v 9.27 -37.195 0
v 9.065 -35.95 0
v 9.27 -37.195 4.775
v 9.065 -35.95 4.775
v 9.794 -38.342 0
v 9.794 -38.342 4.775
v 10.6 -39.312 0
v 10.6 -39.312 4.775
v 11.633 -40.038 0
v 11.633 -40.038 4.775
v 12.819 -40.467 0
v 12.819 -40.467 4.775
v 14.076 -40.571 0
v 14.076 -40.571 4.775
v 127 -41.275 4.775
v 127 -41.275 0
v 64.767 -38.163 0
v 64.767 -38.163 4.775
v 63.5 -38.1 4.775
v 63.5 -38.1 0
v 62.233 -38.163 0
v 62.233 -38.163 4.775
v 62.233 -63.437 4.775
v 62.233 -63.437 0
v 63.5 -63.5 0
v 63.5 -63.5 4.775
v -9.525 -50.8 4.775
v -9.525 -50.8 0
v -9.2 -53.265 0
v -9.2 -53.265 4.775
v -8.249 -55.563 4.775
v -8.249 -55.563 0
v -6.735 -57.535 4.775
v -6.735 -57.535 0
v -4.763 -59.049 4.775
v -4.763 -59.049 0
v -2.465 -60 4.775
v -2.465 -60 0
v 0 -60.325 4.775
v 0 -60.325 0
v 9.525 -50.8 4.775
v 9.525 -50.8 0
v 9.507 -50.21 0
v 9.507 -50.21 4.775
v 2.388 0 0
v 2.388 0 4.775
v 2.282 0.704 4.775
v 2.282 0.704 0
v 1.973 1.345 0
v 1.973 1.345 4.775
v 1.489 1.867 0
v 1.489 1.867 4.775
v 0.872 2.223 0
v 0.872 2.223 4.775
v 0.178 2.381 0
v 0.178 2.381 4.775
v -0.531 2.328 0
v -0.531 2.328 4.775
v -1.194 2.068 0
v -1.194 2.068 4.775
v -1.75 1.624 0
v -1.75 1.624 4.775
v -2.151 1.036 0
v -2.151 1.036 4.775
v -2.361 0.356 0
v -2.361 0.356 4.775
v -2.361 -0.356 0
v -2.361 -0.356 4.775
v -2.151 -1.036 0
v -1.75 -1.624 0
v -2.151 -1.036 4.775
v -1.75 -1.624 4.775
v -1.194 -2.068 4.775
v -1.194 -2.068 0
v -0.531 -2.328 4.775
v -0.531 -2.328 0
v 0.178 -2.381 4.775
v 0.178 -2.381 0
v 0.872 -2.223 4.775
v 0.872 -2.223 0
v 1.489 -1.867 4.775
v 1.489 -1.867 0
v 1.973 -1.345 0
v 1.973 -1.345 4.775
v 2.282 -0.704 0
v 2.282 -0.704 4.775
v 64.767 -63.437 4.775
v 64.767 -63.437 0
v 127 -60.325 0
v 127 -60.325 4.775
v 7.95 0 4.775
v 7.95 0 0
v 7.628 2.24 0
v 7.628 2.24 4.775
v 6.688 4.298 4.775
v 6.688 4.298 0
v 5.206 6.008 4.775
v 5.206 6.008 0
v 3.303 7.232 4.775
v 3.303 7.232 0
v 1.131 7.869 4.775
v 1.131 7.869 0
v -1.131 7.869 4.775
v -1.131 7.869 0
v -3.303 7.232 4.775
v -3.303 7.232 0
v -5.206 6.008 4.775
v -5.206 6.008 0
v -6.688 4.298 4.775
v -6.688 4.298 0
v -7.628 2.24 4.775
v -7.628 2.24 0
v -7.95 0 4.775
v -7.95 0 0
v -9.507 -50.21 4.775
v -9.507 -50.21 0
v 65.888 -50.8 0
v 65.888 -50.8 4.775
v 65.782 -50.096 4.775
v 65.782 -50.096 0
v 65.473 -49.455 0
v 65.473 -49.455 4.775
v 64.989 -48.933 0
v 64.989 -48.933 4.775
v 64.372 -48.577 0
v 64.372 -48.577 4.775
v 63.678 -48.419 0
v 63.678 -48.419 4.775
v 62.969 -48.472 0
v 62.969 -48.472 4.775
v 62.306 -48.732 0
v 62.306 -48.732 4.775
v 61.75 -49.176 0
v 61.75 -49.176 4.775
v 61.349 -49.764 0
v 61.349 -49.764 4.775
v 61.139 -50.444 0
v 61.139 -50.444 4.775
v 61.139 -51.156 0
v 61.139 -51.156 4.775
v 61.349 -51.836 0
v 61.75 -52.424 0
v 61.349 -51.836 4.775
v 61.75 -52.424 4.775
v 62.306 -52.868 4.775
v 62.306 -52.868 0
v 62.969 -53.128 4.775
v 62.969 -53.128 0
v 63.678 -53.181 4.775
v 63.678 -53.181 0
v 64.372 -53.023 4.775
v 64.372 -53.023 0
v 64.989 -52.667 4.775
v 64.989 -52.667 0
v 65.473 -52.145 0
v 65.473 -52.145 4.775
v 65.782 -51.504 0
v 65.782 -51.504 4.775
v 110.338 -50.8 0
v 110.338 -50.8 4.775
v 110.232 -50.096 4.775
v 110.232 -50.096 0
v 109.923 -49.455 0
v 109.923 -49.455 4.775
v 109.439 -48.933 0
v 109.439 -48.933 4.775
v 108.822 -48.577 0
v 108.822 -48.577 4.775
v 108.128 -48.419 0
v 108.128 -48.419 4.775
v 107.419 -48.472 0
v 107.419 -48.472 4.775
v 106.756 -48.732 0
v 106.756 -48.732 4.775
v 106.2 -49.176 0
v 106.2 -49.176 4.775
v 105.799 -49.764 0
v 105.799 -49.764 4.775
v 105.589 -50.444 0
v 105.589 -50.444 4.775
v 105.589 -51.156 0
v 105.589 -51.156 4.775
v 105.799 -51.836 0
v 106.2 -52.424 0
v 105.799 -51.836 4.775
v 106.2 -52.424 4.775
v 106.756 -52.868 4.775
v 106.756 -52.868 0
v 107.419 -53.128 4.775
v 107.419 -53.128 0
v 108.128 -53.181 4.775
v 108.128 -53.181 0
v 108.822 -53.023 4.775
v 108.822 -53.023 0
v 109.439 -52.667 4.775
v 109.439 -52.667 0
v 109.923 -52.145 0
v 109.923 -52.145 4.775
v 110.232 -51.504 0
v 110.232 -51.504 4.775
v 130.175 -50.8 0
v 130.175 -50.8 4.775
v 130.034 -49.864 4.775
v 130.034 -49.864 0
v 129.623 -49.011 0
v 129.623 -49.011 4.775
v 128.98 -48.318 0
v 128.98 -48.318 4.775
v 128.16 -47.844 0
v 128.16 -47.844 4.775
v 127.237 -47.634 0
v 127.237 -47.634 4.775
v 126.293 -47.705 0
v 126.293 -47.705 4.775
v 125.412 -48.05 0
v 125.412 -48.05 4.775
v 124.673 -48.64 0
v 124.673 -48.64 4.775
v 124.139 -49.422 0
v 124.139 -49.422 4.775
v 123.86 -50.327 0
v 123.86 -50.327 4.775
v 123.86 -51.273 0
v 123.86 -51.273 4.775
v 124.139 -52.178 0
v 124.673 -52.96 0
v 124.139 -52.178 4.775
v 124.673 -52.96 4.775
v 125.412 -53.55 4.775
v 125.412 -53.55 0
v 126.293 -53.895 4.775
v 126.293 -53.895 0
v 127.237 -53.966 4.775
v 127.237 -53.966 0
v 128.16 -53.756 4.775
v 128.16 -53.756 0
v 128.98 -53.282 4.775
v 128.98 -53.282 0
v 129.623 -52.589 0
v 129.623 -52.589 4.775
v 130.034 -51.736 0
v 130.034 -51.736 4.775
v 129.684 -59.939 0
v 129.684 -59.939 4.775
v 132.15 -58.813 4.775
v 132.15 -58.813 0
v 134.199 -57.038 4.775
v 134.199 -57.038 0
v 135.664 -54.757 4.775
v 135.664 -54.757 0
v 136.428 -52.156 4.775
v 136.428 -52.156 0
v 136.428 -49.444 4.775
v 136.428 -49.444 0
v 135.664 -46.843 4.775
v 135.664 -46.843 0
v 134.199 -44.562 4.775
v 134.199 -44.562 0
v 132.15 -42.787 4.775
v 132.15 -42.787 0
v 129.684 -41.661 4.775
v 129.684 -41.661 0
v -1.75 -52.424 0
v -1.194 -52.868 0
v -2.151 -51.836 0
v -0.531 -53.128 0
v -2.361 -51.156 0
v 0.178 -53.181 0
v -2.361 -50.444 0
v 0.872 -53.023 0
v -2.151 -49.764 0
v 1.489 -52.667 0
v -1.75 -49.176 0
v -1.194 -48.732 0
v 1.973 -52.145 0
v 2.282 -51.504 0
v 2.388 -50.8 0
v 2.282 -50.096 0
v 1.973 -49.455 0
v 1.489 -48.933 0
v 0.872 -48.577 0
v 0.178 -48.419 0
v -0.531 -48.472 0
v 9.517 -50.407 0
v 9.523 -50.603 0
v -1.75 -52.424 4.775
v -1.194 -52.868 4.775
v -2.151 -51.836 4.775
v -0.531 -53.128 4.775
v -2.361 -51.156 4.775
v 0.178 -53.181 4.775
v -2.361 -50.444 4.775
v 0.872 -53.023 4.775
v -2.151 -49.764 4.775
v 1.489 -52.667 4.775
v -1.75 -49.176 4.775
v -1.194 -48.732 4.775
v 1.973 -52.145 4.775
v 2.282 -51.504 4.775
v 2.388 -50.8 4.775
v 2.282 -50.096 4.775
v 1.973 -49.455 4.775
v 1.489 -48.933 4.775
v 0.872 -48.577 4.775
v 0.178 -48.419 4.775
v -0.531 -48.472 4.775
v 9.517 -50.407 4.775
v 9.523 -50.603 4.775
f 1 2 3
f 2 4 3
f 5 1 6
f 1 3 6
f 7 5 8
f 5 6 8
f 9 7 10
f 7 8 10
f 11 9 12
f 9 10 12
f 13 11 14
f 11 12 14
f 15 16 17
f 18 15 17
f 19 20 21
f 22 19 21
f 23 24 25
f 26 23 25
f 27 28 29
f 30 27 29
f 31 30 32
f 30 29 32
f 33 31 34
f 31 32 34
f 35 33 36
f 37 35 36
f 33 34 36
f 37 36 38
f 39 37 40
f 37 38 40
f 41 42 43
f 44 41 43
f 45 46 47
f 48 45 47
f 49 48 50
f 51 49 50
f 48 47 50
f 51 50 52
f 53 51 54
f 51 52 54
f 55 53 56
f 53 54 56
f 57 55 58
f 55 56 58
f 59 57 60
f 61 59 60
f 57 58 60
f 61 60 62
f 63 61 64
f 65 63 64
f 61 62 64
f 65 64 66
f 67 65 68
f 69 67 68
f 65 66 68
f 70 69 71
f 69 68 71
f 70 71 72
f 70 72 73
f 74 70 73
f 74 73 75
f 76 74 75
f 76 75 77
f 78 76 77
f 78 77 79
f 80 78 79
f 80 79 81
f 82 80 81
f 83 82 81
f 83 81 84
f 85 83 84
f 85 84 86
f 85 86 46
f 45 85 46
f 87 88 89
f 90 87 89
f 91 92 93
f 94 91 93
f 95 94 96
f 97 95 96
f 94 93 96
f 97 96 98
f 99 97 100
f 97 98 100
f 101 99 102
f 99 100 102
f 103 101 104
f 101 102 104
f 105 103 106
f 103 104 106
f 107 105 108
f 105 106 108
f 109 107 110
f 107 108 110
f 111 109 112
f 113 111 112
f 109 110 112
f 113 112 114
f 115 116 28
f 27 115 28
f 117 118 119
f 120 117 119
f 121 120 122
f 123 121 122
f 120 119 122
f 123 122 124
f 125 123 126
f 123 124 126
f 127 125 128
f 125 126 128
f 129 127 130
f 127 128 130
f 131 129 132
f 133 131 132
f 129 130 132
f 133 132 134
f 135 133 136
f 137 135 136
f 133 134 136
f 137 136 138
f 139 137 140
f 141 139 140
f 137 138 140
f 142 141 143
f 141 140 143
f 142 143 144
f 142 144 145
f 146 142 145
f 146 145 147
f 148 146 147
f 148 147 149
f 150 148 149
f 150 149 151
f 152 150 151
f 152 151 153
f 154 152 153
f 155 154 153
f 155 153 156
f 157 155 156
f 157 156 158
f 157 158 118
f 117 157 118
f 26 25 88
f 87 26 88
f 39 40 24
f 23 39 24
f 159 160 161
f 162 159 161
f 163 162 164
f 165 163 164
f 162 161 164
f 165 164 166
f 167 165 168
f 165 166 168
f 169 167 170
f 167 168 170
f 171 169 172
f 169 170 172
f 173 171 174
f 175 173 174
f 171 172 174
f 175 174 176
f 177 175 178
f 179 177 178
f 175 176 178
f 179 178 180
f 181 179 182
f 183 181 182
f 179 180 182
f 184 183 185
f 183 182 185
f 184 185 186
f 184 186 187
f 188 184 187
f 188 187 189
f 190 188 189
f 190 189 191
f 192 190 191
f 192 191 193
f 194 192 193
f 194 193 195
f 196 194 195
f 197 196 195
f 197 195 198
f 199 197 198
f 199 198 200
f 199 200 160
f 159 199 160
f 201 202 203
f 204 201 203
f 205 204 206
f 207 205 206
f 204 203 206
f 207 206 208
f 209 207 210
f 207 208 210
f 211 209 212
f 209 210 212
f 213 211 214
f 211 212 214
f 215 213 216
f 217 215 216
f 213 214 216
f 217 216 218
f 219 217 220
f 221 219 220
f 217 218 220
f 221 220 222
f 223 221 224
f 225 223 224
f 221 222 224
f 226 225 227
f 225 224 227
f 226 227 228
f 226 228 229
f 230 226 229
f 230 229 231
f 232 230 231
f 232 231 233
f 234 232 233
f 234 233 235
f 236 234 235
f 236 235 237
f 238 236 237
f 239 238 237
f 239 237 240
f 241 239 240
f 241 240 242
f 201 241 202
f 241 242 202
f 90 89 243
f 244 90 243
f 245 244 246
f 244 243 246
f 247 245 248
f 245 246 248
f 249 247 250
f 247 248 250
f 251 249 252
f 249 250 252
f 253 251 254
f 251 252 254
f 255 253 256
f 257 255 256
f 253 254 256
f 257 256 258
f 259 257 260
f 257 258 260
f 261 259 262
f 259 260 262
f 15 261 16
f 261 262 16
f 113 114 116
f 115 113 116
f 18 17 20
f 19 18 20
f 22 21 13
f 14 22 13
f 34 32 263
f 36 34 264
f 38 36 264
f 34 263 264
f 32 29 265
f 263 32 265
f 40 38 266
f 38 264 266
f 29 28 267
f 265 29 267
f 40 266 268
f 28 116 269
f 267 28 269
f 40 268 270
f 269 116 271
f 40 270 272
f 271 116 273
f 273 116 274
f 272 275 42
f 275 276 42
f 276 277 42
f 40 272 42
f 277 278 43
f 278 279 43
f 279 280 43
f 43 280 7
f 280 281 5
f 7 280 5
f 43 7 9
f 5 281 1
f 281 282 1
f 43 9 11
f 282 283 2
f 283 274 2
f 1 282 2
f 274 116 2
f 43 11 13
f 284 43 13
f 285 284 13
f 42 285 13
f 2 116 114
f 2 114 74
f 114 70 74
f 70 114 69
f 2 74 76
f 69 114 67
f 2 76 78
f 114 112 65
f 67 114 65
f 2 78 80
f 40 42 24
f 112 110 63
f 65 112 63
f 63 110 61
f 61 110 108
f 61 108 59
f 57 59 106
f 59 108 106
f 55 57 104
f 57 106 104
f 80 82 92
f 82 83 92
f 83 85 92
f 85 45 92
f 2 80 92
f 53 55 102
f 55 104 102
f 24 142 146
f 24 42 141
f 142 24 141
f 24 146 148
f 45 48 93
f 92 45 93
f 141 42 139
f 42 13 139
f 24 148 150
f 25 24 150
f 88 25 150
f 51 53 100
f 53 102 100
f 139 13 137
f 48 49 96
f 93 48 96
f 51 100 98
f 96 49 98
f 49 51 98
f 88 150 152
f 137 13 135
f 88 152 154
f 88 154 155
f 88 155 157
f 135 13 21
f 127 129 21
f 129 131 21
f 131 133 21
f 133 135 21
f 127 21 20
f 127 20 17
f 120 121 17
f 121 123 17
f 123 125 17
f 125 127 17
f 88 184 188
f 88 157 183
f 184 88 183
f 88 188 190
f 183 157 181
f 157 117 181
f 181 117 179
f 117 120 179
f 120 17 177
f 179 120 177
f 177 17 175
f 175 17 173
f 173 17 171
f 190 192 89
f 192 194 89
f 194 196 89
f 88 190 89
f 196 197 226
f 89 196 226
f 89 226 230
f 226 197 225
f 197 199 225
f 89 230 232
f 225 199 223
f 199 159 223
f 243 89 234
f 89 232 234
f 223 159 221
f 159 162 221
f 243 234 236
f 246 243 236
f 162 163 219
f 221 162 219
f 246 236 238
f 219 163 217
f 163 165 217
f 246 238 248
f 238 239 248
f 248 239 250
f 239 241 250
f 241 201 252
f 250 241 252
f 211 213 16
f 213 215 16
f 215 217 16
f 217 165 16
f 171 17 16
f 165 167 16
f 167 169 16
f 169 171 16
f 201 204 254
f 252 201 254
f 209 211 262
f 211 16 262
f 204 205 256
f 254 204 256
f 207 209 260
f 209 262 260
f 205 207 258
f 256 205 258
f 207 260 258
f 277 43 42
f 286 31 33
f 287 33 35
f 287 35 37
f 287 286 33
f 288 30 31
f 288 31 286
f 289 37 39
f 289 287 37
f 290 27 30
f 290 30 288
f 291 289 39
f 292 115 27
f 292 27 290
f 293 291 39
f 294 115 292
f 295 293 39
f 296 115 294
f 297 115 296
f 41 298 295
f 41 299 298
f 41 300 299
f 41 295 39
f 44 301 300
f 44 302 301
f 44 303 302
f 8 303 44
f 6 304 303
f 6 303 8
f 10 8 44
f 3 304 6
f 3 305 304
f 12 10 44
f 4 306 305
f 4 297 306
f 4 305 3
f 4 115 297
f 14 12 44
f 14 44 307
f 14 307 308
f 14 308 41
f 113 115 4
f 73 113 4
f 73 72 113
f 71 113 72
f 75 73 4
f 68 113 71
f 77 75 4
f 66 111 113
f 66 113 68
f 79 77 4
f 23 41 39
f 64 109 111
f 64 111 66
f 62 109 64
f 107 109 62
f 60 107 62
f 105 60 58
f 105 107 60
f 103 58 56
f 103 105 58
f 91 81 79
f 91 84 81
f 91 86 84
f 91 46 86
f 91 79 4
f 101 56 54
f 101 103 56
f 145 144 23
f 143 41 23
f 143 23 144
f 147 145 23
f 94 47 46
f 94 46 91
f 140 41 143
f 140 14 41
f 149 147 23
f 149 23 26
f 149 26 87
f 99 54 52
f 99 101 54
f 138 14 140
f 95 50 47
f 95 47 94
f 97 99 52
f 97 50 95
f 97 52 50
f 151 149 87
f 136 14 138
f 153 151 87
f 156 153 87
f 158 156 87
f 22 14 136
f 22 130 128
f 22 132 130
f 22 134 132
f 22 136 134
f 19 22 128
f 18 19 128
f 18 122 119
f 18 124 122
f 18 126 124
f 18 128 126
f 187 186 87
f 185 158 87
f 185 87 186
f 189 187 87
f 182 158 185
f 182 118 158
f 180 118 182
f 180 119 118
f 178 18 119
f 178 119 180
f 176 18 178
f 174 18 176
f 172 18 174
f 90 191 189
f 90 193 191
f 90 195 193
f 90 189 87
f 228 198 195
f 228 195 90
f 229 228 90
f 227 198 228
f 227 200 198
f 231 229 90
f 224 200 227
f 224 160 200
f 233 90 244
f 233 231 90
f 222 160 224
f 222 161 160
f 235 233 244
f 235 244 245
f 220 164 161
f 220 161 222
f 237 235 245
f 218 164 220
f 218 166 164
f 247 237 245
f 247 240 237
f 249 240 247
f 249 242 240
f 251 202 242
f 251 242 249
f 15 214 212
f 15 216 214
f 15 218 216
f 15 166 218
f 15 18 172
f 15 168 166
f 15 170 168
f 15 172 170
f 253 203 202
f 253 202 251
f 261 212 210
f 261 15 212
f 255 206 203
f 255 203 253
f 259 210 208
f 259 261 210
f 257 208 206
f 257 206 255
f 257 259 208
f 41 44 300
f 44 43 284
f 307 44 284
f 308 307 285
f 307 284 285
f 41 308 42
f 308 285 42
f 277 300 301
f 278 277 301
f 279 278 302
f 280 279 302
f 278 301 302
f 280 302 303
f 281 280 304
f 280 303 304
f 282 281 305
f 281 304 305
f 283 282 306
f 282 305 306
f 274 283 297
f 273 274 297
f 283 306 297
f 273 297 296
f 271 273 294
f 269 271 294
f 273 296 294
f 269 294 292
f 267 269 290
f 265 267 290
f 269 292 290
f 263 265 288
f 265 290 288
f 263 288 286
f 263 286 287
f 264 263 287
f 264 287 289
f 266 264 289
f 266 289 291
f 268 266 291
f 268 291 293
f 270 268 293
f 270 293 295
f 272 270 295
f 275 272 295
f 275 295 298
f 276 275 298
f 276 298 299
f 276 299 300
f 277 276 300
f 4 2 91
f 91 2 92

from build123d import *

# Parameters (mm, degrees)
BOSS_EXTRUDE1_DEPTH = 4.7752
FILLET1_R           = 4.7752
SKETCH2_R           = 2.3876
CUT_EXTRUDE1_DEPTH  = 151.645704088
SKETCH3_R           = 3.175
CUT_EXTRUDE2_DEPTH  = 4.7752


with BuildPart() as part:
    # Sketch1 → Boss-Extrude1 (new body)
    with BuildSketch(Plane.XY):
        with BuildLine():
            ThreePointArc((7.9502, 0), (0, 7.9502), (-7.9502, 0))
            Line((-7.9502, 0), (-9.506710526, -50.210016974))
            Line((-9.506710526, -50.210016974), (-9.525, -50.8))
            ThreePointArc((-9.525, -50.8), (-6.735192091, -57.535192091), (0, -60.325))
            Line((0, -60.325), (62.233167082, -63.436658354))
            Line((62.233167082, -63.436658354), (63.5, -63.5))
            Line((63.5, -63.5), (64.766832918, -63.436658354))
            Line((64.766832918, -63.436658354), (127, -60.325))
            ThreePointArc((127, -60.325), (136.525, -50.8), (127, -41.275))
            Line((127, -41.275), (64.766832918, -38.163341646))
            Line((64.766832918, -38.163341646), (63.5, -38.1))
            Line((63.5, -38.1), (62.233167082, -38.163341646))
            Line((62.233167082, -38.163341646), (9.215441066, -40.814227947))
            Line((9.215441066, -40.814227947), (7.9502, 0))
        make_face()
        with BuildLine():
            Line((9.525, -50.8), (9.506710526, -50.210016974))
            ThreePointArc((9.506710526, -50.210016974), (9.520426534, -50.504866777), (9.525, -50.8))
        make_face(mode=Mode.SUBTRACT)
    extrude(amount=BOSS_EXTRUDE1_DEPTH)

    # Fillet1
    fillet1_edges = [part.edges().sort_by_distance(p)[0] for p in [
        (9.215441066, -40.814227947, 2.3876),
    ]]
    fillet(fillet1_edges, radius=FILLET1_R)

    # Sketch2 → Cut-Extrude1 (cut, through all)
    with BuildSketch(Plane.XY.offset(4.7752)):
        Circle(SKETCH2_R)
        with Locations((0, -50.8)):
            Circle(SKETCH2_R)
        with Locations((63.5, -50.8)):
            Circle(SKETCH2_R)
        with Locations((107.95, -50.8)):
            Circle(SKETCH2_R)
    extrude(amount=-CUT_EXTRUDE1_DEPTH, mode=Mode.SUBTRACT)

    # Sketch3 → Cut-Extrude2 (cut)
    with BuildSketch(Plane.XY.offset(4.7752)):
        with Locations((127, -50.8)):
            Circle(SKETCH3_R)
    extrude(amount=-CUT_EXTRUDE2_DEPTH, mode=Mode.SUBTRACT)


solid = part.part
